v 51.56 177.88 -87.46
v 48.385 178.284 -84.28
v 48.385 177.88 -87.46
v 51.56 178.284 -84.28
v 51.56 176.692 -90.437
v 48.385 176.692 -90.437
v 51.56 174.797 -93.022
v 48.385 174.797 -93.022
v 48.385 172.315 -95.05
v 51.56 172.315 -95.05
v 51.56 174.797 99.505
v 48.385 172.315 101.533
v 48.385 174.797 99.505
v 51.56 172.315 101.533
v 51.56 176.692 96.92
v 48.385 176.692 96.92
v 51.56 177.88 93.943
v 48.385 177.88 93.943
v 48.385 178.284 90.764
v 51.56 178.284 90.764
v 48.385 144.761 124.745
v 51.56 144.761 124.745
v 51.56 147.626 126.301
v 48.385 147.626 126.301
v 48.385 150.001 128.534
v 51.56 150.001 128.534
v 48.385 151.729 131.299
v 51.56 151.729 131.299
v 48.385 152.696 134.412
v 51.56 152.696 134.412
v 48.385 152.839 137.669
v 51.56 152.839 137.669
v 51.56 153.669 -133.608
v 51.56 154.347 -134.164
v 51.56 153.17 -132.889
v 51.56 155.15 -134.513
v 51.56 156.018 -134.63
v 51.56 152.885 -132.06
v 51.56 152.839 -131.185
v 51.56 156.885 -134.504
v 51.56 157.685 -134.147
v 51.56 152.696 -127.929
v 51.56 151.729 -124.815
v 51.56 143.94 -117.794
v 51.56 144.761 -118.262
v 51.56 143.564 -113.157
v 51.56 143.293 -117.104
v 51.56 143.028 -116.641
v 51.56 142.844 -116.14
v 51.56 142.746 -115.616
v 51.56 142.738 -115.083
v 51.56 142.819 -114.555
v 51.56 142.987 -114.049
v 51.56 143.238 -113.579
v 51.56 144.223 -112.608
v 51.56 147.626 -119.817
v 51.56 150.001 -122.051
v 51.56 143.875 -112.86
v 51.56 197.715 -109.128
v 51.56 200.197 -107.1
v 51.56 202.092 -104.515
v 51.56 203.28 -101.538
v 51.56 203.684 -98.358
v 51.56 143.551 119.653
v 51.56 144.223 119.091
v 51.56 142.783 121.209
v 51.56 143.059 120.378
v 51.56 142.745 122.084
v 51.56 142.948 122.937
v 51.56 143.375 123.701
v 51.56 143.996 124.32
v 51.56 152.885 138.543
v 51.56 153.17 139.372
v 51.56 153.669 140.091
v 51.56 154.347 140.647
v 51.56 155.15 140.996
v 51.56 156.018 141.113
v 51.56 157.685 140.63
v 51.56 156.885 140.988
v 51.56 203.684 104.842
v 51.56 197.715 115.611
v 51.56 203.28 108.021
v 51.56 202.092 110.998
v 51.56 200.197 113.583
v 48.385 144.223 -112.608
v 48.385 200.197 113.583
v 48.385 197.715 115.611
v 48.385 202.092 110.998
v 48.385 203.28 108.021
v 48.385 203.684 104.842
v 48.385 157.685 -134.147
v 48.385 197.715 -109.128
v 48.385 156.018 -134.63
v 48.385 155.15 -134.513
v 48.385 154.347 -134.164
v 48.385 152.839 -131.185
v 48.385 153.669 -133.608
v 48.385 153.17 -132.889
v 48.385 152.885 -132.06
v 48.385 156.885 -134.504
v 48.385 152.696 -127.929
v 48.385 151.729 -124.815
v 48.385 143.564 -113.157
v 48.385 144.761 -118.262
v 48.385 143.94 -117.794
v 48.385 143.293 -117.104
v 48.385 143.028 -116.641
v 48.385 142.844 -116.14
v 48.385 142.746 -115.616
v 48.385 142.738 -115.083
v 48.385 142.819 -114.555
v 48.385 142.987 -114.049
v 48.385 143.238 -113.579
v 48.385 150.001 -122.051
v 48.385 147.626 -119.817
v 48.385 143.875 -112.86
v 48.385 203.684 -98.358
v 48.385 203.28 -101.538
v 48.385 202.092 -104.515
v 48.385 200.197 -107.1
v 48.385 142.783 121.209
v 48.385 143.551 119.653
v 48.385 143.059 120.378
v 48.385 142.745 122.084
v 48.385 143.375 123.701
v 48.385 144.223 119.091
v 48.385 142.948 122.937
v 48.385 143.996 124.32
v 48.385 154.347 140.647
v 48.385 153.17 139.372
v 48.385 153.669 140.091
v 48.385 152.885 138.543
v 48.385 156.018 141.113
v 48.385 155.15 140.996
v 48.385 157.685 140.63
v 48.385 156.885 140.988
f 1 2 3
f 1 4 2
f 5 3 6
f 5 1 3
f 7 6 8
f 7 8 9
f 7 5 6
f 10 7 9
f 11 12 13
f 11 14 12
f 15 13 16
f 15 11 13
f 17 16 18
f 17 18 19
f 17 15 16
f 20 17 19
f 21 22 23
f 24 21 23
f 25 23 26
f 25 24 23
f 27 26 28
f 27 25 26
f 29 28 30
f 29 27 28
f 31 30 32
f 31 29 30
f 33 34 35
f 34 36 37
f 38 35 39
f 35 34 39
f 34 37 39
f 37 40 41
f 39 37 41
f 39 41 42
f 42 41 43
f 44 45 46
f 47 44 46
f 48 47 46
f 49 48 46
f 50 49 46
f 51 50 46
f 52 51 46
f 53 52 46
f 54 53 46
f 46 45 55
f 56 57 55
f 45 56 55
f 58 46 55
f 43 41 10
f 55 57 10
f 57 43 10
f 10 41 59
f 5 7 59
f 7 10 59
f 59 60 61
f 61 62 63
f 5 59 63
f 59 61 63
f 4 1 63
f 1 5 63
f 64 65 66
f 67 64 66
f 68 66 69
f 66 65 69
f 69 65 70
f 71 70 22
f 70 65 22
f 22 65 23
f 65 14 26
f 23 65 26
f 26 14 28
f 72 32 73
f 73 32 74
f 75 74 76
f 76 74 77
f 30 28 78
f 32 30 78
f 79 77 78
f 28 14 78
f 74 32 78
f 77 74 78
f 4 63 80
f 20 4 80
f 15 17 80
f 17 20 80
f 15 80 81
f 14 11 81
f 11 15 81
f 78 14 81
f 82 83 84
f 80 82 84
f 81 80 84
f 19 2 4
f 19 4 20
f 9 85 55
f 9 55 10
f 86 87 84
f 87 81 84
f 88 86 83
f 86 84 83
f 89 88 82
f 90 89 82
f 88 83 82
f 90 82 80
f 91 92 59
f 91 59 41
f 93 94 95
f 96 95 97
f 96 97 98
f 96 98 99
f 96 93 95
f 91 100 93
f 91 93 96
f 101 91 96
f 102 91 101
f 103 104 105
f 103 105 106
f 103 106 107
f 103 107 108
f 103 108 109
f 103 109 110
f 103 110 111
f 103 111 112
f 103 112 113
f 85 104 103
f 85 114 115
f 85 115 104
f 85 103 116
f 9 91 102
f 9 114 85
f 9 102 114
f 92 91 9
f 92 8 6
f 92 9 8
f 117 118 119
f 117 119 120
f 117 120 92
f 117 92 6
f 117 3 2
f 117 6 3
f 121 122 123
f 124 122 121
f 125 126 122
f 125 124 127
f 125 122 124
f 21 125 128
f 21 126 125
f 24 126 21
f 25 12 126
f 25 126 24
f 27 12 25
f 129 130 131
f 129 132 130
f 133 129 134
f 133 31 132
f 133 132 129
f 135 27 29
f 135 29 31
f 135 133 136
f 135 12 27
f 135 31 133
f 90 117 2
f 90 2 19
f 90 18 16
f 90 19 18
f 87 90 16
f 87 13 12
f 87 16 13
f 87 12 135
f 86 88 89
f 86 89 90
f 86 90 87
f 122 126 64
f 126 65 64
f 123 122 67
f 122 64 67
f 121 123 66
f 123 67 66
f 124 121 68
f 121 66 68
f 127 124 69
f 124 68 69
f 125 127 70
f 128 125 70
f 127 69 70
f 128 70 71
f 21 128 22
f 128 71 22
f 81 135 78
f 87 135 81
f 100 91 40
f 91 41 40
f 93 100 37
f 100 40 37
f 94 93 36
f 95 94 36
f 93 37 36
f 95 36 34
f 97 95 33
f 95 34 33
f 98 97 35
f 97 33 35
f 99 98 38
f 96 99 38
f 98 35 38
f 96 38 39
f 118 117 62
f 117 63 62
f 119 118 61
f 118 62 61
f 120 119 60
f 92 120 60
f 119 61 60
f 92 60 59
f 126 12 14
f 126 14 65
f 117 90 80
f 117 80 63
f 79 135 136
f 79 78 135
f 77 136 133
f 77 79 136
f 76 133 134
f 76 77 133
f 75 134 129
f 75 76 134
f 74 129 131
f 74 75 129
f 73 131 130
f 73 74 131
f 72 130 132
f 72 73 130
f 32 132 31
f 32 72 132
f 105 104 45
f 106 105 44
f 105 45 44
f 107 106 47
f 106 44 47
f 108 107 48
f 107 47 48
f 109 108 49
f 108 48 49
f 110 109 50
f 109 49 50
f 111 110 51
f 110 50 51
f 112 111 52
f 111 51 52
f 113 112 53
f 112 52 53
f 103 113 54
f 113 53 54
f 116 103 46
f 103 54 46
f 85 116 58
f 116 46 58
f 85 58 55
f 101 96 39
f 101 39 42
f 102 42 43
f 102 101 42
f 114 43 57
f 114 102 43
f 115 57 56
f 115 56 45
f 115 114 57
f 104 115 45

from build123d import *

# Parameters (mm, degrees)
BOSS_EXTRUDE1_DEPTH = 3.175
FILLET1_R           = 3.175
FILLET2_R           = 12.7


with BuildPart() as part:
    # Sketch1 → Boss-Extrude1 (new body)
    with BuildSketch(Plane(origin=(48.385492731365964, 0, 0), x_dir=(0, 0, -1), z_dir=(1, 0, 0))):
        with BuildLine():
            Line((-147.36118847527575, 146.91537779675497), (-111.88055506155092, 203.68439125871458))
            Line((-111.88055506155092, 203.68439125871458), (105.39733503272873, 203.68439125871458))
            Line((105.39733503272873, 203.68439125871458), (140.8779684464535, 146.91537779675497))
            ThreePointArc((140.8779684464535, 146.91537779675497), (123.3774034475485, 150.95396971957916), (119.33881152472429, 133.45340472067417))
            Line((119.33881152472429, 133.45340472067417), (91.31944493844902, 178.28439125871458))
            Line((91.31944493844902, 178.28439125871458), (-97.80266496727123, 178.28439125871458))
            Line((-97.80266496727123, 178.28439125871458), (-125.82203155354657, 133.45340472067417))
            ThreePointArc((-125.82203155354657, 133.45340472067417), (-129.8606234763708, 150.95396971957913), (-147.36118847527575, 146.91537779675497))
        make_face()
    extrude(amount=BOSS_EXTRUDE1_DEPTH)

    # Fillet1
    fillet1_edges = [part.edges().sort_by_distance(p)[0] for p in [
        (49.97299273136596, 146.91537779675497, 147.36118847527575),
        (49.97299273136596, 146.91537779675497, -140.8779684464535),
        (49.97299273136596, 133.45340472067417, -119.33881152472429),
        (49.97299273136596, 133.45340472067417, 125.82203155354657),
    ]]
    fillet(fillet1_edges, radius=FILLET1_R)

    # Fillet2
    fillet2_edges = [part.edges().sort_by_distance(p)[0] for p in [
        (49.97299273136596, 203.68439125871458, 111.88055506155092),
        (49.97299273136596, 203.68439125871458, -105.39733503272873),
        (49.97299273136596, 178.28439125871458, -91.31944493844902),
        (49.97299273136596, 178.28439125871458, 97.80266496727123),
    ]]
    fillet(fillet2_edges, radius=FILLET2_R)


solid = part.part
